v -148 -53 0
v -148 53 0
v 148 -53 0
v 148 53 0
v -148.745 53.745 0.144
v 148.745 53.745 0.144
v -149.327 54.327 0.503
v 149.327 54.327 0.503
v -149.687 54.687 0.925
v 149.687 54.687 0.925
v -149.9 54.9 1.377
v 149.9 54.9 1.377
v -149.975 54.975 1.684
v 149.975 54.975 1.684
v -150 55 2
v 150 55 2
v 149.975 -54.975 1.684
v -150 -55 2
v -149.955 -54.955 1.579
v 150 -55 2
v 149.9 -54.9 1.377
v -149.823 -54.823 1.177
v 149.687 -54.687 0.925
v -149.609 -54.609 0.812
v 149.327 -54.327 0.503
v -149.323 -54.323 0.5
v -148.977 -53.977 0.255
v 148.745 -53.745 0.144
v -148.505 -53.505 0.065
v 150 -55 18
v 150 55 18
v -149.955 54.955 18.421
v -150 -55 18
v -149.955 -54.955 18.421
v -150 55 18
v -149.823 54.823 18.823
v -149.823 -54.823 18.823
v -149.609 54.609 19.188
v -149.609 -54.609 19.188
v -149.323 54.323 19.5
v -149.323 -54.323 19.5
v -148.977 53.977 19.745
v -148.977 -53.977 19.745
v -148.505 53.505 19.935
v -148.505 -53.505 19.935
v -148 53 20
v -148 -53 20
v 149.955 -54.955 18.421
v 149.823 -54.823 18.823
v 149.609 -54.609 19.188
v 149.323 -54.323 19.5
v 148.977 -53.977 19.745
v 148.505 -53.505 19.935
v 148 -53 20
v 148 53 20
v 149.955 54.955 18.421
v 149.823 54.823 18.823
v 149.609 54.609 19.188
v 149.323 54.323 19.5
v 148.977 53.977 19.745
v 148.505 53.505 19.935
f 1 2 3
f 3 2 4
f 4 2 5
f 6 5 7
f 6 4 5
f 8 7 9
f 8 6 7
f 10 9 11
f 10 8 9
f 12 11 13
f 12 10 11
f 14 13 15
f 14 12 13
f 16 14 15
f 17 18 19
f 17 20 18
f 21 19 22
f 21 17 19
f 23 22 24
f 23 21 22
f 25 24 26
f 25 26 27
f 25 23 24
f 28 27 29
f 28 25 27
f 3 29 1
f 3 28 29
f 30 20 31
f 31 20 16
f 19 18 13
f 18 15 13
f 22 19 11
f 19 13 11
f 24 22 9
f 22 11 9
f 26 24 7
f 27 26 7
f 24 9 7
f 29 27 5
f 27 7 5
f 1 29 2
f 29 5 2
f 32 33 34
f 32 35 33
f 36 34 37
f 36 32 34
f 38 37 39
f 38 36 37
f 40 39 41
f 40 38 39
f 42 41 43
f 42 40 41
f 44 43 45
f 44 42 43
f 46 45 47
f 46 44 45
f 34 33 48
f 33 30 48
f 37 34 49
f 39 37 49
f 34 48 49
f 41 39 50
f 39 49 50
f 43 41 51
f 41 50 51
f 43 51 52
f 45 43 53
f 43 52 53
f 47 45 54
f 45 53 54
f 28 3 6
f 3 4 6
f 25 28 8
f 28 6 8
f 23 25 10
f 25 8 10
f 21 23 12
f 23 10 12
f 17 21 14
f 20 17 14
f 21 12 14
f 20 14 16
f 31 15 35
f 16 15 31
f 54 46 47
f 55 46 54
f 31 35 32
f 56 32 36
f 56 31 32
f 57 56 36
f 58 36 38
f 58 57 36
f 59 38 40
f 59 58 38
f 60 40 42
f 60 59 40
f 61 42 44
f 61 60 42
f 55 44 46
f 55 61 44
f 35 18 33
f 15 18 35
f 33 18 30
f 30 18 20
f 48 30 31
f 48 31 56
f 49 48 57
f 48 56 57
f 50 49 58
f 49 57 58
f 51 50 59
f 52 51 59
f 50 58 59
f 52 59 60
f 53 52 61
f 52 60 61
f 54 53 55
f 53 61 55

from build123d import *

# Parameters (mm, degrees)
SKETCH001_W = 300
SKETCH001_H = 110
PAD_DEPTH   = 20
FILLET_R    = 2
FILLET001_R = 2


with BuildPart() as part:
    # Sketch001 → Pad (new body)
    with BuildSketch(Plane.XY):
        Rectangle(SKETCH001_W, SKETCH001_H)
    extrude(amount=PAD_DEPTH)

    # Fillet
    fillet_edges = [part.edges().sort_by_distance(p)[0] for p in [
        (0, 55, 20),
        (150, 0, 20),
        (0, -55, 20),
        (-150, 0, 20),
    ]]
    fillet(fillet_edges, radius=FILLET_R)

    # Fillet001
    fillet001_edges = [part.edges().sort_by_distance(p)[0] for p in [
        (0, 55, 0),
        (150, 0, 0),
        (0, -55, 0),
        (-150, 0, 0),
    ]]
    fillet(fillet001_edges, radius=FILLET001_R)


solid = part.part
